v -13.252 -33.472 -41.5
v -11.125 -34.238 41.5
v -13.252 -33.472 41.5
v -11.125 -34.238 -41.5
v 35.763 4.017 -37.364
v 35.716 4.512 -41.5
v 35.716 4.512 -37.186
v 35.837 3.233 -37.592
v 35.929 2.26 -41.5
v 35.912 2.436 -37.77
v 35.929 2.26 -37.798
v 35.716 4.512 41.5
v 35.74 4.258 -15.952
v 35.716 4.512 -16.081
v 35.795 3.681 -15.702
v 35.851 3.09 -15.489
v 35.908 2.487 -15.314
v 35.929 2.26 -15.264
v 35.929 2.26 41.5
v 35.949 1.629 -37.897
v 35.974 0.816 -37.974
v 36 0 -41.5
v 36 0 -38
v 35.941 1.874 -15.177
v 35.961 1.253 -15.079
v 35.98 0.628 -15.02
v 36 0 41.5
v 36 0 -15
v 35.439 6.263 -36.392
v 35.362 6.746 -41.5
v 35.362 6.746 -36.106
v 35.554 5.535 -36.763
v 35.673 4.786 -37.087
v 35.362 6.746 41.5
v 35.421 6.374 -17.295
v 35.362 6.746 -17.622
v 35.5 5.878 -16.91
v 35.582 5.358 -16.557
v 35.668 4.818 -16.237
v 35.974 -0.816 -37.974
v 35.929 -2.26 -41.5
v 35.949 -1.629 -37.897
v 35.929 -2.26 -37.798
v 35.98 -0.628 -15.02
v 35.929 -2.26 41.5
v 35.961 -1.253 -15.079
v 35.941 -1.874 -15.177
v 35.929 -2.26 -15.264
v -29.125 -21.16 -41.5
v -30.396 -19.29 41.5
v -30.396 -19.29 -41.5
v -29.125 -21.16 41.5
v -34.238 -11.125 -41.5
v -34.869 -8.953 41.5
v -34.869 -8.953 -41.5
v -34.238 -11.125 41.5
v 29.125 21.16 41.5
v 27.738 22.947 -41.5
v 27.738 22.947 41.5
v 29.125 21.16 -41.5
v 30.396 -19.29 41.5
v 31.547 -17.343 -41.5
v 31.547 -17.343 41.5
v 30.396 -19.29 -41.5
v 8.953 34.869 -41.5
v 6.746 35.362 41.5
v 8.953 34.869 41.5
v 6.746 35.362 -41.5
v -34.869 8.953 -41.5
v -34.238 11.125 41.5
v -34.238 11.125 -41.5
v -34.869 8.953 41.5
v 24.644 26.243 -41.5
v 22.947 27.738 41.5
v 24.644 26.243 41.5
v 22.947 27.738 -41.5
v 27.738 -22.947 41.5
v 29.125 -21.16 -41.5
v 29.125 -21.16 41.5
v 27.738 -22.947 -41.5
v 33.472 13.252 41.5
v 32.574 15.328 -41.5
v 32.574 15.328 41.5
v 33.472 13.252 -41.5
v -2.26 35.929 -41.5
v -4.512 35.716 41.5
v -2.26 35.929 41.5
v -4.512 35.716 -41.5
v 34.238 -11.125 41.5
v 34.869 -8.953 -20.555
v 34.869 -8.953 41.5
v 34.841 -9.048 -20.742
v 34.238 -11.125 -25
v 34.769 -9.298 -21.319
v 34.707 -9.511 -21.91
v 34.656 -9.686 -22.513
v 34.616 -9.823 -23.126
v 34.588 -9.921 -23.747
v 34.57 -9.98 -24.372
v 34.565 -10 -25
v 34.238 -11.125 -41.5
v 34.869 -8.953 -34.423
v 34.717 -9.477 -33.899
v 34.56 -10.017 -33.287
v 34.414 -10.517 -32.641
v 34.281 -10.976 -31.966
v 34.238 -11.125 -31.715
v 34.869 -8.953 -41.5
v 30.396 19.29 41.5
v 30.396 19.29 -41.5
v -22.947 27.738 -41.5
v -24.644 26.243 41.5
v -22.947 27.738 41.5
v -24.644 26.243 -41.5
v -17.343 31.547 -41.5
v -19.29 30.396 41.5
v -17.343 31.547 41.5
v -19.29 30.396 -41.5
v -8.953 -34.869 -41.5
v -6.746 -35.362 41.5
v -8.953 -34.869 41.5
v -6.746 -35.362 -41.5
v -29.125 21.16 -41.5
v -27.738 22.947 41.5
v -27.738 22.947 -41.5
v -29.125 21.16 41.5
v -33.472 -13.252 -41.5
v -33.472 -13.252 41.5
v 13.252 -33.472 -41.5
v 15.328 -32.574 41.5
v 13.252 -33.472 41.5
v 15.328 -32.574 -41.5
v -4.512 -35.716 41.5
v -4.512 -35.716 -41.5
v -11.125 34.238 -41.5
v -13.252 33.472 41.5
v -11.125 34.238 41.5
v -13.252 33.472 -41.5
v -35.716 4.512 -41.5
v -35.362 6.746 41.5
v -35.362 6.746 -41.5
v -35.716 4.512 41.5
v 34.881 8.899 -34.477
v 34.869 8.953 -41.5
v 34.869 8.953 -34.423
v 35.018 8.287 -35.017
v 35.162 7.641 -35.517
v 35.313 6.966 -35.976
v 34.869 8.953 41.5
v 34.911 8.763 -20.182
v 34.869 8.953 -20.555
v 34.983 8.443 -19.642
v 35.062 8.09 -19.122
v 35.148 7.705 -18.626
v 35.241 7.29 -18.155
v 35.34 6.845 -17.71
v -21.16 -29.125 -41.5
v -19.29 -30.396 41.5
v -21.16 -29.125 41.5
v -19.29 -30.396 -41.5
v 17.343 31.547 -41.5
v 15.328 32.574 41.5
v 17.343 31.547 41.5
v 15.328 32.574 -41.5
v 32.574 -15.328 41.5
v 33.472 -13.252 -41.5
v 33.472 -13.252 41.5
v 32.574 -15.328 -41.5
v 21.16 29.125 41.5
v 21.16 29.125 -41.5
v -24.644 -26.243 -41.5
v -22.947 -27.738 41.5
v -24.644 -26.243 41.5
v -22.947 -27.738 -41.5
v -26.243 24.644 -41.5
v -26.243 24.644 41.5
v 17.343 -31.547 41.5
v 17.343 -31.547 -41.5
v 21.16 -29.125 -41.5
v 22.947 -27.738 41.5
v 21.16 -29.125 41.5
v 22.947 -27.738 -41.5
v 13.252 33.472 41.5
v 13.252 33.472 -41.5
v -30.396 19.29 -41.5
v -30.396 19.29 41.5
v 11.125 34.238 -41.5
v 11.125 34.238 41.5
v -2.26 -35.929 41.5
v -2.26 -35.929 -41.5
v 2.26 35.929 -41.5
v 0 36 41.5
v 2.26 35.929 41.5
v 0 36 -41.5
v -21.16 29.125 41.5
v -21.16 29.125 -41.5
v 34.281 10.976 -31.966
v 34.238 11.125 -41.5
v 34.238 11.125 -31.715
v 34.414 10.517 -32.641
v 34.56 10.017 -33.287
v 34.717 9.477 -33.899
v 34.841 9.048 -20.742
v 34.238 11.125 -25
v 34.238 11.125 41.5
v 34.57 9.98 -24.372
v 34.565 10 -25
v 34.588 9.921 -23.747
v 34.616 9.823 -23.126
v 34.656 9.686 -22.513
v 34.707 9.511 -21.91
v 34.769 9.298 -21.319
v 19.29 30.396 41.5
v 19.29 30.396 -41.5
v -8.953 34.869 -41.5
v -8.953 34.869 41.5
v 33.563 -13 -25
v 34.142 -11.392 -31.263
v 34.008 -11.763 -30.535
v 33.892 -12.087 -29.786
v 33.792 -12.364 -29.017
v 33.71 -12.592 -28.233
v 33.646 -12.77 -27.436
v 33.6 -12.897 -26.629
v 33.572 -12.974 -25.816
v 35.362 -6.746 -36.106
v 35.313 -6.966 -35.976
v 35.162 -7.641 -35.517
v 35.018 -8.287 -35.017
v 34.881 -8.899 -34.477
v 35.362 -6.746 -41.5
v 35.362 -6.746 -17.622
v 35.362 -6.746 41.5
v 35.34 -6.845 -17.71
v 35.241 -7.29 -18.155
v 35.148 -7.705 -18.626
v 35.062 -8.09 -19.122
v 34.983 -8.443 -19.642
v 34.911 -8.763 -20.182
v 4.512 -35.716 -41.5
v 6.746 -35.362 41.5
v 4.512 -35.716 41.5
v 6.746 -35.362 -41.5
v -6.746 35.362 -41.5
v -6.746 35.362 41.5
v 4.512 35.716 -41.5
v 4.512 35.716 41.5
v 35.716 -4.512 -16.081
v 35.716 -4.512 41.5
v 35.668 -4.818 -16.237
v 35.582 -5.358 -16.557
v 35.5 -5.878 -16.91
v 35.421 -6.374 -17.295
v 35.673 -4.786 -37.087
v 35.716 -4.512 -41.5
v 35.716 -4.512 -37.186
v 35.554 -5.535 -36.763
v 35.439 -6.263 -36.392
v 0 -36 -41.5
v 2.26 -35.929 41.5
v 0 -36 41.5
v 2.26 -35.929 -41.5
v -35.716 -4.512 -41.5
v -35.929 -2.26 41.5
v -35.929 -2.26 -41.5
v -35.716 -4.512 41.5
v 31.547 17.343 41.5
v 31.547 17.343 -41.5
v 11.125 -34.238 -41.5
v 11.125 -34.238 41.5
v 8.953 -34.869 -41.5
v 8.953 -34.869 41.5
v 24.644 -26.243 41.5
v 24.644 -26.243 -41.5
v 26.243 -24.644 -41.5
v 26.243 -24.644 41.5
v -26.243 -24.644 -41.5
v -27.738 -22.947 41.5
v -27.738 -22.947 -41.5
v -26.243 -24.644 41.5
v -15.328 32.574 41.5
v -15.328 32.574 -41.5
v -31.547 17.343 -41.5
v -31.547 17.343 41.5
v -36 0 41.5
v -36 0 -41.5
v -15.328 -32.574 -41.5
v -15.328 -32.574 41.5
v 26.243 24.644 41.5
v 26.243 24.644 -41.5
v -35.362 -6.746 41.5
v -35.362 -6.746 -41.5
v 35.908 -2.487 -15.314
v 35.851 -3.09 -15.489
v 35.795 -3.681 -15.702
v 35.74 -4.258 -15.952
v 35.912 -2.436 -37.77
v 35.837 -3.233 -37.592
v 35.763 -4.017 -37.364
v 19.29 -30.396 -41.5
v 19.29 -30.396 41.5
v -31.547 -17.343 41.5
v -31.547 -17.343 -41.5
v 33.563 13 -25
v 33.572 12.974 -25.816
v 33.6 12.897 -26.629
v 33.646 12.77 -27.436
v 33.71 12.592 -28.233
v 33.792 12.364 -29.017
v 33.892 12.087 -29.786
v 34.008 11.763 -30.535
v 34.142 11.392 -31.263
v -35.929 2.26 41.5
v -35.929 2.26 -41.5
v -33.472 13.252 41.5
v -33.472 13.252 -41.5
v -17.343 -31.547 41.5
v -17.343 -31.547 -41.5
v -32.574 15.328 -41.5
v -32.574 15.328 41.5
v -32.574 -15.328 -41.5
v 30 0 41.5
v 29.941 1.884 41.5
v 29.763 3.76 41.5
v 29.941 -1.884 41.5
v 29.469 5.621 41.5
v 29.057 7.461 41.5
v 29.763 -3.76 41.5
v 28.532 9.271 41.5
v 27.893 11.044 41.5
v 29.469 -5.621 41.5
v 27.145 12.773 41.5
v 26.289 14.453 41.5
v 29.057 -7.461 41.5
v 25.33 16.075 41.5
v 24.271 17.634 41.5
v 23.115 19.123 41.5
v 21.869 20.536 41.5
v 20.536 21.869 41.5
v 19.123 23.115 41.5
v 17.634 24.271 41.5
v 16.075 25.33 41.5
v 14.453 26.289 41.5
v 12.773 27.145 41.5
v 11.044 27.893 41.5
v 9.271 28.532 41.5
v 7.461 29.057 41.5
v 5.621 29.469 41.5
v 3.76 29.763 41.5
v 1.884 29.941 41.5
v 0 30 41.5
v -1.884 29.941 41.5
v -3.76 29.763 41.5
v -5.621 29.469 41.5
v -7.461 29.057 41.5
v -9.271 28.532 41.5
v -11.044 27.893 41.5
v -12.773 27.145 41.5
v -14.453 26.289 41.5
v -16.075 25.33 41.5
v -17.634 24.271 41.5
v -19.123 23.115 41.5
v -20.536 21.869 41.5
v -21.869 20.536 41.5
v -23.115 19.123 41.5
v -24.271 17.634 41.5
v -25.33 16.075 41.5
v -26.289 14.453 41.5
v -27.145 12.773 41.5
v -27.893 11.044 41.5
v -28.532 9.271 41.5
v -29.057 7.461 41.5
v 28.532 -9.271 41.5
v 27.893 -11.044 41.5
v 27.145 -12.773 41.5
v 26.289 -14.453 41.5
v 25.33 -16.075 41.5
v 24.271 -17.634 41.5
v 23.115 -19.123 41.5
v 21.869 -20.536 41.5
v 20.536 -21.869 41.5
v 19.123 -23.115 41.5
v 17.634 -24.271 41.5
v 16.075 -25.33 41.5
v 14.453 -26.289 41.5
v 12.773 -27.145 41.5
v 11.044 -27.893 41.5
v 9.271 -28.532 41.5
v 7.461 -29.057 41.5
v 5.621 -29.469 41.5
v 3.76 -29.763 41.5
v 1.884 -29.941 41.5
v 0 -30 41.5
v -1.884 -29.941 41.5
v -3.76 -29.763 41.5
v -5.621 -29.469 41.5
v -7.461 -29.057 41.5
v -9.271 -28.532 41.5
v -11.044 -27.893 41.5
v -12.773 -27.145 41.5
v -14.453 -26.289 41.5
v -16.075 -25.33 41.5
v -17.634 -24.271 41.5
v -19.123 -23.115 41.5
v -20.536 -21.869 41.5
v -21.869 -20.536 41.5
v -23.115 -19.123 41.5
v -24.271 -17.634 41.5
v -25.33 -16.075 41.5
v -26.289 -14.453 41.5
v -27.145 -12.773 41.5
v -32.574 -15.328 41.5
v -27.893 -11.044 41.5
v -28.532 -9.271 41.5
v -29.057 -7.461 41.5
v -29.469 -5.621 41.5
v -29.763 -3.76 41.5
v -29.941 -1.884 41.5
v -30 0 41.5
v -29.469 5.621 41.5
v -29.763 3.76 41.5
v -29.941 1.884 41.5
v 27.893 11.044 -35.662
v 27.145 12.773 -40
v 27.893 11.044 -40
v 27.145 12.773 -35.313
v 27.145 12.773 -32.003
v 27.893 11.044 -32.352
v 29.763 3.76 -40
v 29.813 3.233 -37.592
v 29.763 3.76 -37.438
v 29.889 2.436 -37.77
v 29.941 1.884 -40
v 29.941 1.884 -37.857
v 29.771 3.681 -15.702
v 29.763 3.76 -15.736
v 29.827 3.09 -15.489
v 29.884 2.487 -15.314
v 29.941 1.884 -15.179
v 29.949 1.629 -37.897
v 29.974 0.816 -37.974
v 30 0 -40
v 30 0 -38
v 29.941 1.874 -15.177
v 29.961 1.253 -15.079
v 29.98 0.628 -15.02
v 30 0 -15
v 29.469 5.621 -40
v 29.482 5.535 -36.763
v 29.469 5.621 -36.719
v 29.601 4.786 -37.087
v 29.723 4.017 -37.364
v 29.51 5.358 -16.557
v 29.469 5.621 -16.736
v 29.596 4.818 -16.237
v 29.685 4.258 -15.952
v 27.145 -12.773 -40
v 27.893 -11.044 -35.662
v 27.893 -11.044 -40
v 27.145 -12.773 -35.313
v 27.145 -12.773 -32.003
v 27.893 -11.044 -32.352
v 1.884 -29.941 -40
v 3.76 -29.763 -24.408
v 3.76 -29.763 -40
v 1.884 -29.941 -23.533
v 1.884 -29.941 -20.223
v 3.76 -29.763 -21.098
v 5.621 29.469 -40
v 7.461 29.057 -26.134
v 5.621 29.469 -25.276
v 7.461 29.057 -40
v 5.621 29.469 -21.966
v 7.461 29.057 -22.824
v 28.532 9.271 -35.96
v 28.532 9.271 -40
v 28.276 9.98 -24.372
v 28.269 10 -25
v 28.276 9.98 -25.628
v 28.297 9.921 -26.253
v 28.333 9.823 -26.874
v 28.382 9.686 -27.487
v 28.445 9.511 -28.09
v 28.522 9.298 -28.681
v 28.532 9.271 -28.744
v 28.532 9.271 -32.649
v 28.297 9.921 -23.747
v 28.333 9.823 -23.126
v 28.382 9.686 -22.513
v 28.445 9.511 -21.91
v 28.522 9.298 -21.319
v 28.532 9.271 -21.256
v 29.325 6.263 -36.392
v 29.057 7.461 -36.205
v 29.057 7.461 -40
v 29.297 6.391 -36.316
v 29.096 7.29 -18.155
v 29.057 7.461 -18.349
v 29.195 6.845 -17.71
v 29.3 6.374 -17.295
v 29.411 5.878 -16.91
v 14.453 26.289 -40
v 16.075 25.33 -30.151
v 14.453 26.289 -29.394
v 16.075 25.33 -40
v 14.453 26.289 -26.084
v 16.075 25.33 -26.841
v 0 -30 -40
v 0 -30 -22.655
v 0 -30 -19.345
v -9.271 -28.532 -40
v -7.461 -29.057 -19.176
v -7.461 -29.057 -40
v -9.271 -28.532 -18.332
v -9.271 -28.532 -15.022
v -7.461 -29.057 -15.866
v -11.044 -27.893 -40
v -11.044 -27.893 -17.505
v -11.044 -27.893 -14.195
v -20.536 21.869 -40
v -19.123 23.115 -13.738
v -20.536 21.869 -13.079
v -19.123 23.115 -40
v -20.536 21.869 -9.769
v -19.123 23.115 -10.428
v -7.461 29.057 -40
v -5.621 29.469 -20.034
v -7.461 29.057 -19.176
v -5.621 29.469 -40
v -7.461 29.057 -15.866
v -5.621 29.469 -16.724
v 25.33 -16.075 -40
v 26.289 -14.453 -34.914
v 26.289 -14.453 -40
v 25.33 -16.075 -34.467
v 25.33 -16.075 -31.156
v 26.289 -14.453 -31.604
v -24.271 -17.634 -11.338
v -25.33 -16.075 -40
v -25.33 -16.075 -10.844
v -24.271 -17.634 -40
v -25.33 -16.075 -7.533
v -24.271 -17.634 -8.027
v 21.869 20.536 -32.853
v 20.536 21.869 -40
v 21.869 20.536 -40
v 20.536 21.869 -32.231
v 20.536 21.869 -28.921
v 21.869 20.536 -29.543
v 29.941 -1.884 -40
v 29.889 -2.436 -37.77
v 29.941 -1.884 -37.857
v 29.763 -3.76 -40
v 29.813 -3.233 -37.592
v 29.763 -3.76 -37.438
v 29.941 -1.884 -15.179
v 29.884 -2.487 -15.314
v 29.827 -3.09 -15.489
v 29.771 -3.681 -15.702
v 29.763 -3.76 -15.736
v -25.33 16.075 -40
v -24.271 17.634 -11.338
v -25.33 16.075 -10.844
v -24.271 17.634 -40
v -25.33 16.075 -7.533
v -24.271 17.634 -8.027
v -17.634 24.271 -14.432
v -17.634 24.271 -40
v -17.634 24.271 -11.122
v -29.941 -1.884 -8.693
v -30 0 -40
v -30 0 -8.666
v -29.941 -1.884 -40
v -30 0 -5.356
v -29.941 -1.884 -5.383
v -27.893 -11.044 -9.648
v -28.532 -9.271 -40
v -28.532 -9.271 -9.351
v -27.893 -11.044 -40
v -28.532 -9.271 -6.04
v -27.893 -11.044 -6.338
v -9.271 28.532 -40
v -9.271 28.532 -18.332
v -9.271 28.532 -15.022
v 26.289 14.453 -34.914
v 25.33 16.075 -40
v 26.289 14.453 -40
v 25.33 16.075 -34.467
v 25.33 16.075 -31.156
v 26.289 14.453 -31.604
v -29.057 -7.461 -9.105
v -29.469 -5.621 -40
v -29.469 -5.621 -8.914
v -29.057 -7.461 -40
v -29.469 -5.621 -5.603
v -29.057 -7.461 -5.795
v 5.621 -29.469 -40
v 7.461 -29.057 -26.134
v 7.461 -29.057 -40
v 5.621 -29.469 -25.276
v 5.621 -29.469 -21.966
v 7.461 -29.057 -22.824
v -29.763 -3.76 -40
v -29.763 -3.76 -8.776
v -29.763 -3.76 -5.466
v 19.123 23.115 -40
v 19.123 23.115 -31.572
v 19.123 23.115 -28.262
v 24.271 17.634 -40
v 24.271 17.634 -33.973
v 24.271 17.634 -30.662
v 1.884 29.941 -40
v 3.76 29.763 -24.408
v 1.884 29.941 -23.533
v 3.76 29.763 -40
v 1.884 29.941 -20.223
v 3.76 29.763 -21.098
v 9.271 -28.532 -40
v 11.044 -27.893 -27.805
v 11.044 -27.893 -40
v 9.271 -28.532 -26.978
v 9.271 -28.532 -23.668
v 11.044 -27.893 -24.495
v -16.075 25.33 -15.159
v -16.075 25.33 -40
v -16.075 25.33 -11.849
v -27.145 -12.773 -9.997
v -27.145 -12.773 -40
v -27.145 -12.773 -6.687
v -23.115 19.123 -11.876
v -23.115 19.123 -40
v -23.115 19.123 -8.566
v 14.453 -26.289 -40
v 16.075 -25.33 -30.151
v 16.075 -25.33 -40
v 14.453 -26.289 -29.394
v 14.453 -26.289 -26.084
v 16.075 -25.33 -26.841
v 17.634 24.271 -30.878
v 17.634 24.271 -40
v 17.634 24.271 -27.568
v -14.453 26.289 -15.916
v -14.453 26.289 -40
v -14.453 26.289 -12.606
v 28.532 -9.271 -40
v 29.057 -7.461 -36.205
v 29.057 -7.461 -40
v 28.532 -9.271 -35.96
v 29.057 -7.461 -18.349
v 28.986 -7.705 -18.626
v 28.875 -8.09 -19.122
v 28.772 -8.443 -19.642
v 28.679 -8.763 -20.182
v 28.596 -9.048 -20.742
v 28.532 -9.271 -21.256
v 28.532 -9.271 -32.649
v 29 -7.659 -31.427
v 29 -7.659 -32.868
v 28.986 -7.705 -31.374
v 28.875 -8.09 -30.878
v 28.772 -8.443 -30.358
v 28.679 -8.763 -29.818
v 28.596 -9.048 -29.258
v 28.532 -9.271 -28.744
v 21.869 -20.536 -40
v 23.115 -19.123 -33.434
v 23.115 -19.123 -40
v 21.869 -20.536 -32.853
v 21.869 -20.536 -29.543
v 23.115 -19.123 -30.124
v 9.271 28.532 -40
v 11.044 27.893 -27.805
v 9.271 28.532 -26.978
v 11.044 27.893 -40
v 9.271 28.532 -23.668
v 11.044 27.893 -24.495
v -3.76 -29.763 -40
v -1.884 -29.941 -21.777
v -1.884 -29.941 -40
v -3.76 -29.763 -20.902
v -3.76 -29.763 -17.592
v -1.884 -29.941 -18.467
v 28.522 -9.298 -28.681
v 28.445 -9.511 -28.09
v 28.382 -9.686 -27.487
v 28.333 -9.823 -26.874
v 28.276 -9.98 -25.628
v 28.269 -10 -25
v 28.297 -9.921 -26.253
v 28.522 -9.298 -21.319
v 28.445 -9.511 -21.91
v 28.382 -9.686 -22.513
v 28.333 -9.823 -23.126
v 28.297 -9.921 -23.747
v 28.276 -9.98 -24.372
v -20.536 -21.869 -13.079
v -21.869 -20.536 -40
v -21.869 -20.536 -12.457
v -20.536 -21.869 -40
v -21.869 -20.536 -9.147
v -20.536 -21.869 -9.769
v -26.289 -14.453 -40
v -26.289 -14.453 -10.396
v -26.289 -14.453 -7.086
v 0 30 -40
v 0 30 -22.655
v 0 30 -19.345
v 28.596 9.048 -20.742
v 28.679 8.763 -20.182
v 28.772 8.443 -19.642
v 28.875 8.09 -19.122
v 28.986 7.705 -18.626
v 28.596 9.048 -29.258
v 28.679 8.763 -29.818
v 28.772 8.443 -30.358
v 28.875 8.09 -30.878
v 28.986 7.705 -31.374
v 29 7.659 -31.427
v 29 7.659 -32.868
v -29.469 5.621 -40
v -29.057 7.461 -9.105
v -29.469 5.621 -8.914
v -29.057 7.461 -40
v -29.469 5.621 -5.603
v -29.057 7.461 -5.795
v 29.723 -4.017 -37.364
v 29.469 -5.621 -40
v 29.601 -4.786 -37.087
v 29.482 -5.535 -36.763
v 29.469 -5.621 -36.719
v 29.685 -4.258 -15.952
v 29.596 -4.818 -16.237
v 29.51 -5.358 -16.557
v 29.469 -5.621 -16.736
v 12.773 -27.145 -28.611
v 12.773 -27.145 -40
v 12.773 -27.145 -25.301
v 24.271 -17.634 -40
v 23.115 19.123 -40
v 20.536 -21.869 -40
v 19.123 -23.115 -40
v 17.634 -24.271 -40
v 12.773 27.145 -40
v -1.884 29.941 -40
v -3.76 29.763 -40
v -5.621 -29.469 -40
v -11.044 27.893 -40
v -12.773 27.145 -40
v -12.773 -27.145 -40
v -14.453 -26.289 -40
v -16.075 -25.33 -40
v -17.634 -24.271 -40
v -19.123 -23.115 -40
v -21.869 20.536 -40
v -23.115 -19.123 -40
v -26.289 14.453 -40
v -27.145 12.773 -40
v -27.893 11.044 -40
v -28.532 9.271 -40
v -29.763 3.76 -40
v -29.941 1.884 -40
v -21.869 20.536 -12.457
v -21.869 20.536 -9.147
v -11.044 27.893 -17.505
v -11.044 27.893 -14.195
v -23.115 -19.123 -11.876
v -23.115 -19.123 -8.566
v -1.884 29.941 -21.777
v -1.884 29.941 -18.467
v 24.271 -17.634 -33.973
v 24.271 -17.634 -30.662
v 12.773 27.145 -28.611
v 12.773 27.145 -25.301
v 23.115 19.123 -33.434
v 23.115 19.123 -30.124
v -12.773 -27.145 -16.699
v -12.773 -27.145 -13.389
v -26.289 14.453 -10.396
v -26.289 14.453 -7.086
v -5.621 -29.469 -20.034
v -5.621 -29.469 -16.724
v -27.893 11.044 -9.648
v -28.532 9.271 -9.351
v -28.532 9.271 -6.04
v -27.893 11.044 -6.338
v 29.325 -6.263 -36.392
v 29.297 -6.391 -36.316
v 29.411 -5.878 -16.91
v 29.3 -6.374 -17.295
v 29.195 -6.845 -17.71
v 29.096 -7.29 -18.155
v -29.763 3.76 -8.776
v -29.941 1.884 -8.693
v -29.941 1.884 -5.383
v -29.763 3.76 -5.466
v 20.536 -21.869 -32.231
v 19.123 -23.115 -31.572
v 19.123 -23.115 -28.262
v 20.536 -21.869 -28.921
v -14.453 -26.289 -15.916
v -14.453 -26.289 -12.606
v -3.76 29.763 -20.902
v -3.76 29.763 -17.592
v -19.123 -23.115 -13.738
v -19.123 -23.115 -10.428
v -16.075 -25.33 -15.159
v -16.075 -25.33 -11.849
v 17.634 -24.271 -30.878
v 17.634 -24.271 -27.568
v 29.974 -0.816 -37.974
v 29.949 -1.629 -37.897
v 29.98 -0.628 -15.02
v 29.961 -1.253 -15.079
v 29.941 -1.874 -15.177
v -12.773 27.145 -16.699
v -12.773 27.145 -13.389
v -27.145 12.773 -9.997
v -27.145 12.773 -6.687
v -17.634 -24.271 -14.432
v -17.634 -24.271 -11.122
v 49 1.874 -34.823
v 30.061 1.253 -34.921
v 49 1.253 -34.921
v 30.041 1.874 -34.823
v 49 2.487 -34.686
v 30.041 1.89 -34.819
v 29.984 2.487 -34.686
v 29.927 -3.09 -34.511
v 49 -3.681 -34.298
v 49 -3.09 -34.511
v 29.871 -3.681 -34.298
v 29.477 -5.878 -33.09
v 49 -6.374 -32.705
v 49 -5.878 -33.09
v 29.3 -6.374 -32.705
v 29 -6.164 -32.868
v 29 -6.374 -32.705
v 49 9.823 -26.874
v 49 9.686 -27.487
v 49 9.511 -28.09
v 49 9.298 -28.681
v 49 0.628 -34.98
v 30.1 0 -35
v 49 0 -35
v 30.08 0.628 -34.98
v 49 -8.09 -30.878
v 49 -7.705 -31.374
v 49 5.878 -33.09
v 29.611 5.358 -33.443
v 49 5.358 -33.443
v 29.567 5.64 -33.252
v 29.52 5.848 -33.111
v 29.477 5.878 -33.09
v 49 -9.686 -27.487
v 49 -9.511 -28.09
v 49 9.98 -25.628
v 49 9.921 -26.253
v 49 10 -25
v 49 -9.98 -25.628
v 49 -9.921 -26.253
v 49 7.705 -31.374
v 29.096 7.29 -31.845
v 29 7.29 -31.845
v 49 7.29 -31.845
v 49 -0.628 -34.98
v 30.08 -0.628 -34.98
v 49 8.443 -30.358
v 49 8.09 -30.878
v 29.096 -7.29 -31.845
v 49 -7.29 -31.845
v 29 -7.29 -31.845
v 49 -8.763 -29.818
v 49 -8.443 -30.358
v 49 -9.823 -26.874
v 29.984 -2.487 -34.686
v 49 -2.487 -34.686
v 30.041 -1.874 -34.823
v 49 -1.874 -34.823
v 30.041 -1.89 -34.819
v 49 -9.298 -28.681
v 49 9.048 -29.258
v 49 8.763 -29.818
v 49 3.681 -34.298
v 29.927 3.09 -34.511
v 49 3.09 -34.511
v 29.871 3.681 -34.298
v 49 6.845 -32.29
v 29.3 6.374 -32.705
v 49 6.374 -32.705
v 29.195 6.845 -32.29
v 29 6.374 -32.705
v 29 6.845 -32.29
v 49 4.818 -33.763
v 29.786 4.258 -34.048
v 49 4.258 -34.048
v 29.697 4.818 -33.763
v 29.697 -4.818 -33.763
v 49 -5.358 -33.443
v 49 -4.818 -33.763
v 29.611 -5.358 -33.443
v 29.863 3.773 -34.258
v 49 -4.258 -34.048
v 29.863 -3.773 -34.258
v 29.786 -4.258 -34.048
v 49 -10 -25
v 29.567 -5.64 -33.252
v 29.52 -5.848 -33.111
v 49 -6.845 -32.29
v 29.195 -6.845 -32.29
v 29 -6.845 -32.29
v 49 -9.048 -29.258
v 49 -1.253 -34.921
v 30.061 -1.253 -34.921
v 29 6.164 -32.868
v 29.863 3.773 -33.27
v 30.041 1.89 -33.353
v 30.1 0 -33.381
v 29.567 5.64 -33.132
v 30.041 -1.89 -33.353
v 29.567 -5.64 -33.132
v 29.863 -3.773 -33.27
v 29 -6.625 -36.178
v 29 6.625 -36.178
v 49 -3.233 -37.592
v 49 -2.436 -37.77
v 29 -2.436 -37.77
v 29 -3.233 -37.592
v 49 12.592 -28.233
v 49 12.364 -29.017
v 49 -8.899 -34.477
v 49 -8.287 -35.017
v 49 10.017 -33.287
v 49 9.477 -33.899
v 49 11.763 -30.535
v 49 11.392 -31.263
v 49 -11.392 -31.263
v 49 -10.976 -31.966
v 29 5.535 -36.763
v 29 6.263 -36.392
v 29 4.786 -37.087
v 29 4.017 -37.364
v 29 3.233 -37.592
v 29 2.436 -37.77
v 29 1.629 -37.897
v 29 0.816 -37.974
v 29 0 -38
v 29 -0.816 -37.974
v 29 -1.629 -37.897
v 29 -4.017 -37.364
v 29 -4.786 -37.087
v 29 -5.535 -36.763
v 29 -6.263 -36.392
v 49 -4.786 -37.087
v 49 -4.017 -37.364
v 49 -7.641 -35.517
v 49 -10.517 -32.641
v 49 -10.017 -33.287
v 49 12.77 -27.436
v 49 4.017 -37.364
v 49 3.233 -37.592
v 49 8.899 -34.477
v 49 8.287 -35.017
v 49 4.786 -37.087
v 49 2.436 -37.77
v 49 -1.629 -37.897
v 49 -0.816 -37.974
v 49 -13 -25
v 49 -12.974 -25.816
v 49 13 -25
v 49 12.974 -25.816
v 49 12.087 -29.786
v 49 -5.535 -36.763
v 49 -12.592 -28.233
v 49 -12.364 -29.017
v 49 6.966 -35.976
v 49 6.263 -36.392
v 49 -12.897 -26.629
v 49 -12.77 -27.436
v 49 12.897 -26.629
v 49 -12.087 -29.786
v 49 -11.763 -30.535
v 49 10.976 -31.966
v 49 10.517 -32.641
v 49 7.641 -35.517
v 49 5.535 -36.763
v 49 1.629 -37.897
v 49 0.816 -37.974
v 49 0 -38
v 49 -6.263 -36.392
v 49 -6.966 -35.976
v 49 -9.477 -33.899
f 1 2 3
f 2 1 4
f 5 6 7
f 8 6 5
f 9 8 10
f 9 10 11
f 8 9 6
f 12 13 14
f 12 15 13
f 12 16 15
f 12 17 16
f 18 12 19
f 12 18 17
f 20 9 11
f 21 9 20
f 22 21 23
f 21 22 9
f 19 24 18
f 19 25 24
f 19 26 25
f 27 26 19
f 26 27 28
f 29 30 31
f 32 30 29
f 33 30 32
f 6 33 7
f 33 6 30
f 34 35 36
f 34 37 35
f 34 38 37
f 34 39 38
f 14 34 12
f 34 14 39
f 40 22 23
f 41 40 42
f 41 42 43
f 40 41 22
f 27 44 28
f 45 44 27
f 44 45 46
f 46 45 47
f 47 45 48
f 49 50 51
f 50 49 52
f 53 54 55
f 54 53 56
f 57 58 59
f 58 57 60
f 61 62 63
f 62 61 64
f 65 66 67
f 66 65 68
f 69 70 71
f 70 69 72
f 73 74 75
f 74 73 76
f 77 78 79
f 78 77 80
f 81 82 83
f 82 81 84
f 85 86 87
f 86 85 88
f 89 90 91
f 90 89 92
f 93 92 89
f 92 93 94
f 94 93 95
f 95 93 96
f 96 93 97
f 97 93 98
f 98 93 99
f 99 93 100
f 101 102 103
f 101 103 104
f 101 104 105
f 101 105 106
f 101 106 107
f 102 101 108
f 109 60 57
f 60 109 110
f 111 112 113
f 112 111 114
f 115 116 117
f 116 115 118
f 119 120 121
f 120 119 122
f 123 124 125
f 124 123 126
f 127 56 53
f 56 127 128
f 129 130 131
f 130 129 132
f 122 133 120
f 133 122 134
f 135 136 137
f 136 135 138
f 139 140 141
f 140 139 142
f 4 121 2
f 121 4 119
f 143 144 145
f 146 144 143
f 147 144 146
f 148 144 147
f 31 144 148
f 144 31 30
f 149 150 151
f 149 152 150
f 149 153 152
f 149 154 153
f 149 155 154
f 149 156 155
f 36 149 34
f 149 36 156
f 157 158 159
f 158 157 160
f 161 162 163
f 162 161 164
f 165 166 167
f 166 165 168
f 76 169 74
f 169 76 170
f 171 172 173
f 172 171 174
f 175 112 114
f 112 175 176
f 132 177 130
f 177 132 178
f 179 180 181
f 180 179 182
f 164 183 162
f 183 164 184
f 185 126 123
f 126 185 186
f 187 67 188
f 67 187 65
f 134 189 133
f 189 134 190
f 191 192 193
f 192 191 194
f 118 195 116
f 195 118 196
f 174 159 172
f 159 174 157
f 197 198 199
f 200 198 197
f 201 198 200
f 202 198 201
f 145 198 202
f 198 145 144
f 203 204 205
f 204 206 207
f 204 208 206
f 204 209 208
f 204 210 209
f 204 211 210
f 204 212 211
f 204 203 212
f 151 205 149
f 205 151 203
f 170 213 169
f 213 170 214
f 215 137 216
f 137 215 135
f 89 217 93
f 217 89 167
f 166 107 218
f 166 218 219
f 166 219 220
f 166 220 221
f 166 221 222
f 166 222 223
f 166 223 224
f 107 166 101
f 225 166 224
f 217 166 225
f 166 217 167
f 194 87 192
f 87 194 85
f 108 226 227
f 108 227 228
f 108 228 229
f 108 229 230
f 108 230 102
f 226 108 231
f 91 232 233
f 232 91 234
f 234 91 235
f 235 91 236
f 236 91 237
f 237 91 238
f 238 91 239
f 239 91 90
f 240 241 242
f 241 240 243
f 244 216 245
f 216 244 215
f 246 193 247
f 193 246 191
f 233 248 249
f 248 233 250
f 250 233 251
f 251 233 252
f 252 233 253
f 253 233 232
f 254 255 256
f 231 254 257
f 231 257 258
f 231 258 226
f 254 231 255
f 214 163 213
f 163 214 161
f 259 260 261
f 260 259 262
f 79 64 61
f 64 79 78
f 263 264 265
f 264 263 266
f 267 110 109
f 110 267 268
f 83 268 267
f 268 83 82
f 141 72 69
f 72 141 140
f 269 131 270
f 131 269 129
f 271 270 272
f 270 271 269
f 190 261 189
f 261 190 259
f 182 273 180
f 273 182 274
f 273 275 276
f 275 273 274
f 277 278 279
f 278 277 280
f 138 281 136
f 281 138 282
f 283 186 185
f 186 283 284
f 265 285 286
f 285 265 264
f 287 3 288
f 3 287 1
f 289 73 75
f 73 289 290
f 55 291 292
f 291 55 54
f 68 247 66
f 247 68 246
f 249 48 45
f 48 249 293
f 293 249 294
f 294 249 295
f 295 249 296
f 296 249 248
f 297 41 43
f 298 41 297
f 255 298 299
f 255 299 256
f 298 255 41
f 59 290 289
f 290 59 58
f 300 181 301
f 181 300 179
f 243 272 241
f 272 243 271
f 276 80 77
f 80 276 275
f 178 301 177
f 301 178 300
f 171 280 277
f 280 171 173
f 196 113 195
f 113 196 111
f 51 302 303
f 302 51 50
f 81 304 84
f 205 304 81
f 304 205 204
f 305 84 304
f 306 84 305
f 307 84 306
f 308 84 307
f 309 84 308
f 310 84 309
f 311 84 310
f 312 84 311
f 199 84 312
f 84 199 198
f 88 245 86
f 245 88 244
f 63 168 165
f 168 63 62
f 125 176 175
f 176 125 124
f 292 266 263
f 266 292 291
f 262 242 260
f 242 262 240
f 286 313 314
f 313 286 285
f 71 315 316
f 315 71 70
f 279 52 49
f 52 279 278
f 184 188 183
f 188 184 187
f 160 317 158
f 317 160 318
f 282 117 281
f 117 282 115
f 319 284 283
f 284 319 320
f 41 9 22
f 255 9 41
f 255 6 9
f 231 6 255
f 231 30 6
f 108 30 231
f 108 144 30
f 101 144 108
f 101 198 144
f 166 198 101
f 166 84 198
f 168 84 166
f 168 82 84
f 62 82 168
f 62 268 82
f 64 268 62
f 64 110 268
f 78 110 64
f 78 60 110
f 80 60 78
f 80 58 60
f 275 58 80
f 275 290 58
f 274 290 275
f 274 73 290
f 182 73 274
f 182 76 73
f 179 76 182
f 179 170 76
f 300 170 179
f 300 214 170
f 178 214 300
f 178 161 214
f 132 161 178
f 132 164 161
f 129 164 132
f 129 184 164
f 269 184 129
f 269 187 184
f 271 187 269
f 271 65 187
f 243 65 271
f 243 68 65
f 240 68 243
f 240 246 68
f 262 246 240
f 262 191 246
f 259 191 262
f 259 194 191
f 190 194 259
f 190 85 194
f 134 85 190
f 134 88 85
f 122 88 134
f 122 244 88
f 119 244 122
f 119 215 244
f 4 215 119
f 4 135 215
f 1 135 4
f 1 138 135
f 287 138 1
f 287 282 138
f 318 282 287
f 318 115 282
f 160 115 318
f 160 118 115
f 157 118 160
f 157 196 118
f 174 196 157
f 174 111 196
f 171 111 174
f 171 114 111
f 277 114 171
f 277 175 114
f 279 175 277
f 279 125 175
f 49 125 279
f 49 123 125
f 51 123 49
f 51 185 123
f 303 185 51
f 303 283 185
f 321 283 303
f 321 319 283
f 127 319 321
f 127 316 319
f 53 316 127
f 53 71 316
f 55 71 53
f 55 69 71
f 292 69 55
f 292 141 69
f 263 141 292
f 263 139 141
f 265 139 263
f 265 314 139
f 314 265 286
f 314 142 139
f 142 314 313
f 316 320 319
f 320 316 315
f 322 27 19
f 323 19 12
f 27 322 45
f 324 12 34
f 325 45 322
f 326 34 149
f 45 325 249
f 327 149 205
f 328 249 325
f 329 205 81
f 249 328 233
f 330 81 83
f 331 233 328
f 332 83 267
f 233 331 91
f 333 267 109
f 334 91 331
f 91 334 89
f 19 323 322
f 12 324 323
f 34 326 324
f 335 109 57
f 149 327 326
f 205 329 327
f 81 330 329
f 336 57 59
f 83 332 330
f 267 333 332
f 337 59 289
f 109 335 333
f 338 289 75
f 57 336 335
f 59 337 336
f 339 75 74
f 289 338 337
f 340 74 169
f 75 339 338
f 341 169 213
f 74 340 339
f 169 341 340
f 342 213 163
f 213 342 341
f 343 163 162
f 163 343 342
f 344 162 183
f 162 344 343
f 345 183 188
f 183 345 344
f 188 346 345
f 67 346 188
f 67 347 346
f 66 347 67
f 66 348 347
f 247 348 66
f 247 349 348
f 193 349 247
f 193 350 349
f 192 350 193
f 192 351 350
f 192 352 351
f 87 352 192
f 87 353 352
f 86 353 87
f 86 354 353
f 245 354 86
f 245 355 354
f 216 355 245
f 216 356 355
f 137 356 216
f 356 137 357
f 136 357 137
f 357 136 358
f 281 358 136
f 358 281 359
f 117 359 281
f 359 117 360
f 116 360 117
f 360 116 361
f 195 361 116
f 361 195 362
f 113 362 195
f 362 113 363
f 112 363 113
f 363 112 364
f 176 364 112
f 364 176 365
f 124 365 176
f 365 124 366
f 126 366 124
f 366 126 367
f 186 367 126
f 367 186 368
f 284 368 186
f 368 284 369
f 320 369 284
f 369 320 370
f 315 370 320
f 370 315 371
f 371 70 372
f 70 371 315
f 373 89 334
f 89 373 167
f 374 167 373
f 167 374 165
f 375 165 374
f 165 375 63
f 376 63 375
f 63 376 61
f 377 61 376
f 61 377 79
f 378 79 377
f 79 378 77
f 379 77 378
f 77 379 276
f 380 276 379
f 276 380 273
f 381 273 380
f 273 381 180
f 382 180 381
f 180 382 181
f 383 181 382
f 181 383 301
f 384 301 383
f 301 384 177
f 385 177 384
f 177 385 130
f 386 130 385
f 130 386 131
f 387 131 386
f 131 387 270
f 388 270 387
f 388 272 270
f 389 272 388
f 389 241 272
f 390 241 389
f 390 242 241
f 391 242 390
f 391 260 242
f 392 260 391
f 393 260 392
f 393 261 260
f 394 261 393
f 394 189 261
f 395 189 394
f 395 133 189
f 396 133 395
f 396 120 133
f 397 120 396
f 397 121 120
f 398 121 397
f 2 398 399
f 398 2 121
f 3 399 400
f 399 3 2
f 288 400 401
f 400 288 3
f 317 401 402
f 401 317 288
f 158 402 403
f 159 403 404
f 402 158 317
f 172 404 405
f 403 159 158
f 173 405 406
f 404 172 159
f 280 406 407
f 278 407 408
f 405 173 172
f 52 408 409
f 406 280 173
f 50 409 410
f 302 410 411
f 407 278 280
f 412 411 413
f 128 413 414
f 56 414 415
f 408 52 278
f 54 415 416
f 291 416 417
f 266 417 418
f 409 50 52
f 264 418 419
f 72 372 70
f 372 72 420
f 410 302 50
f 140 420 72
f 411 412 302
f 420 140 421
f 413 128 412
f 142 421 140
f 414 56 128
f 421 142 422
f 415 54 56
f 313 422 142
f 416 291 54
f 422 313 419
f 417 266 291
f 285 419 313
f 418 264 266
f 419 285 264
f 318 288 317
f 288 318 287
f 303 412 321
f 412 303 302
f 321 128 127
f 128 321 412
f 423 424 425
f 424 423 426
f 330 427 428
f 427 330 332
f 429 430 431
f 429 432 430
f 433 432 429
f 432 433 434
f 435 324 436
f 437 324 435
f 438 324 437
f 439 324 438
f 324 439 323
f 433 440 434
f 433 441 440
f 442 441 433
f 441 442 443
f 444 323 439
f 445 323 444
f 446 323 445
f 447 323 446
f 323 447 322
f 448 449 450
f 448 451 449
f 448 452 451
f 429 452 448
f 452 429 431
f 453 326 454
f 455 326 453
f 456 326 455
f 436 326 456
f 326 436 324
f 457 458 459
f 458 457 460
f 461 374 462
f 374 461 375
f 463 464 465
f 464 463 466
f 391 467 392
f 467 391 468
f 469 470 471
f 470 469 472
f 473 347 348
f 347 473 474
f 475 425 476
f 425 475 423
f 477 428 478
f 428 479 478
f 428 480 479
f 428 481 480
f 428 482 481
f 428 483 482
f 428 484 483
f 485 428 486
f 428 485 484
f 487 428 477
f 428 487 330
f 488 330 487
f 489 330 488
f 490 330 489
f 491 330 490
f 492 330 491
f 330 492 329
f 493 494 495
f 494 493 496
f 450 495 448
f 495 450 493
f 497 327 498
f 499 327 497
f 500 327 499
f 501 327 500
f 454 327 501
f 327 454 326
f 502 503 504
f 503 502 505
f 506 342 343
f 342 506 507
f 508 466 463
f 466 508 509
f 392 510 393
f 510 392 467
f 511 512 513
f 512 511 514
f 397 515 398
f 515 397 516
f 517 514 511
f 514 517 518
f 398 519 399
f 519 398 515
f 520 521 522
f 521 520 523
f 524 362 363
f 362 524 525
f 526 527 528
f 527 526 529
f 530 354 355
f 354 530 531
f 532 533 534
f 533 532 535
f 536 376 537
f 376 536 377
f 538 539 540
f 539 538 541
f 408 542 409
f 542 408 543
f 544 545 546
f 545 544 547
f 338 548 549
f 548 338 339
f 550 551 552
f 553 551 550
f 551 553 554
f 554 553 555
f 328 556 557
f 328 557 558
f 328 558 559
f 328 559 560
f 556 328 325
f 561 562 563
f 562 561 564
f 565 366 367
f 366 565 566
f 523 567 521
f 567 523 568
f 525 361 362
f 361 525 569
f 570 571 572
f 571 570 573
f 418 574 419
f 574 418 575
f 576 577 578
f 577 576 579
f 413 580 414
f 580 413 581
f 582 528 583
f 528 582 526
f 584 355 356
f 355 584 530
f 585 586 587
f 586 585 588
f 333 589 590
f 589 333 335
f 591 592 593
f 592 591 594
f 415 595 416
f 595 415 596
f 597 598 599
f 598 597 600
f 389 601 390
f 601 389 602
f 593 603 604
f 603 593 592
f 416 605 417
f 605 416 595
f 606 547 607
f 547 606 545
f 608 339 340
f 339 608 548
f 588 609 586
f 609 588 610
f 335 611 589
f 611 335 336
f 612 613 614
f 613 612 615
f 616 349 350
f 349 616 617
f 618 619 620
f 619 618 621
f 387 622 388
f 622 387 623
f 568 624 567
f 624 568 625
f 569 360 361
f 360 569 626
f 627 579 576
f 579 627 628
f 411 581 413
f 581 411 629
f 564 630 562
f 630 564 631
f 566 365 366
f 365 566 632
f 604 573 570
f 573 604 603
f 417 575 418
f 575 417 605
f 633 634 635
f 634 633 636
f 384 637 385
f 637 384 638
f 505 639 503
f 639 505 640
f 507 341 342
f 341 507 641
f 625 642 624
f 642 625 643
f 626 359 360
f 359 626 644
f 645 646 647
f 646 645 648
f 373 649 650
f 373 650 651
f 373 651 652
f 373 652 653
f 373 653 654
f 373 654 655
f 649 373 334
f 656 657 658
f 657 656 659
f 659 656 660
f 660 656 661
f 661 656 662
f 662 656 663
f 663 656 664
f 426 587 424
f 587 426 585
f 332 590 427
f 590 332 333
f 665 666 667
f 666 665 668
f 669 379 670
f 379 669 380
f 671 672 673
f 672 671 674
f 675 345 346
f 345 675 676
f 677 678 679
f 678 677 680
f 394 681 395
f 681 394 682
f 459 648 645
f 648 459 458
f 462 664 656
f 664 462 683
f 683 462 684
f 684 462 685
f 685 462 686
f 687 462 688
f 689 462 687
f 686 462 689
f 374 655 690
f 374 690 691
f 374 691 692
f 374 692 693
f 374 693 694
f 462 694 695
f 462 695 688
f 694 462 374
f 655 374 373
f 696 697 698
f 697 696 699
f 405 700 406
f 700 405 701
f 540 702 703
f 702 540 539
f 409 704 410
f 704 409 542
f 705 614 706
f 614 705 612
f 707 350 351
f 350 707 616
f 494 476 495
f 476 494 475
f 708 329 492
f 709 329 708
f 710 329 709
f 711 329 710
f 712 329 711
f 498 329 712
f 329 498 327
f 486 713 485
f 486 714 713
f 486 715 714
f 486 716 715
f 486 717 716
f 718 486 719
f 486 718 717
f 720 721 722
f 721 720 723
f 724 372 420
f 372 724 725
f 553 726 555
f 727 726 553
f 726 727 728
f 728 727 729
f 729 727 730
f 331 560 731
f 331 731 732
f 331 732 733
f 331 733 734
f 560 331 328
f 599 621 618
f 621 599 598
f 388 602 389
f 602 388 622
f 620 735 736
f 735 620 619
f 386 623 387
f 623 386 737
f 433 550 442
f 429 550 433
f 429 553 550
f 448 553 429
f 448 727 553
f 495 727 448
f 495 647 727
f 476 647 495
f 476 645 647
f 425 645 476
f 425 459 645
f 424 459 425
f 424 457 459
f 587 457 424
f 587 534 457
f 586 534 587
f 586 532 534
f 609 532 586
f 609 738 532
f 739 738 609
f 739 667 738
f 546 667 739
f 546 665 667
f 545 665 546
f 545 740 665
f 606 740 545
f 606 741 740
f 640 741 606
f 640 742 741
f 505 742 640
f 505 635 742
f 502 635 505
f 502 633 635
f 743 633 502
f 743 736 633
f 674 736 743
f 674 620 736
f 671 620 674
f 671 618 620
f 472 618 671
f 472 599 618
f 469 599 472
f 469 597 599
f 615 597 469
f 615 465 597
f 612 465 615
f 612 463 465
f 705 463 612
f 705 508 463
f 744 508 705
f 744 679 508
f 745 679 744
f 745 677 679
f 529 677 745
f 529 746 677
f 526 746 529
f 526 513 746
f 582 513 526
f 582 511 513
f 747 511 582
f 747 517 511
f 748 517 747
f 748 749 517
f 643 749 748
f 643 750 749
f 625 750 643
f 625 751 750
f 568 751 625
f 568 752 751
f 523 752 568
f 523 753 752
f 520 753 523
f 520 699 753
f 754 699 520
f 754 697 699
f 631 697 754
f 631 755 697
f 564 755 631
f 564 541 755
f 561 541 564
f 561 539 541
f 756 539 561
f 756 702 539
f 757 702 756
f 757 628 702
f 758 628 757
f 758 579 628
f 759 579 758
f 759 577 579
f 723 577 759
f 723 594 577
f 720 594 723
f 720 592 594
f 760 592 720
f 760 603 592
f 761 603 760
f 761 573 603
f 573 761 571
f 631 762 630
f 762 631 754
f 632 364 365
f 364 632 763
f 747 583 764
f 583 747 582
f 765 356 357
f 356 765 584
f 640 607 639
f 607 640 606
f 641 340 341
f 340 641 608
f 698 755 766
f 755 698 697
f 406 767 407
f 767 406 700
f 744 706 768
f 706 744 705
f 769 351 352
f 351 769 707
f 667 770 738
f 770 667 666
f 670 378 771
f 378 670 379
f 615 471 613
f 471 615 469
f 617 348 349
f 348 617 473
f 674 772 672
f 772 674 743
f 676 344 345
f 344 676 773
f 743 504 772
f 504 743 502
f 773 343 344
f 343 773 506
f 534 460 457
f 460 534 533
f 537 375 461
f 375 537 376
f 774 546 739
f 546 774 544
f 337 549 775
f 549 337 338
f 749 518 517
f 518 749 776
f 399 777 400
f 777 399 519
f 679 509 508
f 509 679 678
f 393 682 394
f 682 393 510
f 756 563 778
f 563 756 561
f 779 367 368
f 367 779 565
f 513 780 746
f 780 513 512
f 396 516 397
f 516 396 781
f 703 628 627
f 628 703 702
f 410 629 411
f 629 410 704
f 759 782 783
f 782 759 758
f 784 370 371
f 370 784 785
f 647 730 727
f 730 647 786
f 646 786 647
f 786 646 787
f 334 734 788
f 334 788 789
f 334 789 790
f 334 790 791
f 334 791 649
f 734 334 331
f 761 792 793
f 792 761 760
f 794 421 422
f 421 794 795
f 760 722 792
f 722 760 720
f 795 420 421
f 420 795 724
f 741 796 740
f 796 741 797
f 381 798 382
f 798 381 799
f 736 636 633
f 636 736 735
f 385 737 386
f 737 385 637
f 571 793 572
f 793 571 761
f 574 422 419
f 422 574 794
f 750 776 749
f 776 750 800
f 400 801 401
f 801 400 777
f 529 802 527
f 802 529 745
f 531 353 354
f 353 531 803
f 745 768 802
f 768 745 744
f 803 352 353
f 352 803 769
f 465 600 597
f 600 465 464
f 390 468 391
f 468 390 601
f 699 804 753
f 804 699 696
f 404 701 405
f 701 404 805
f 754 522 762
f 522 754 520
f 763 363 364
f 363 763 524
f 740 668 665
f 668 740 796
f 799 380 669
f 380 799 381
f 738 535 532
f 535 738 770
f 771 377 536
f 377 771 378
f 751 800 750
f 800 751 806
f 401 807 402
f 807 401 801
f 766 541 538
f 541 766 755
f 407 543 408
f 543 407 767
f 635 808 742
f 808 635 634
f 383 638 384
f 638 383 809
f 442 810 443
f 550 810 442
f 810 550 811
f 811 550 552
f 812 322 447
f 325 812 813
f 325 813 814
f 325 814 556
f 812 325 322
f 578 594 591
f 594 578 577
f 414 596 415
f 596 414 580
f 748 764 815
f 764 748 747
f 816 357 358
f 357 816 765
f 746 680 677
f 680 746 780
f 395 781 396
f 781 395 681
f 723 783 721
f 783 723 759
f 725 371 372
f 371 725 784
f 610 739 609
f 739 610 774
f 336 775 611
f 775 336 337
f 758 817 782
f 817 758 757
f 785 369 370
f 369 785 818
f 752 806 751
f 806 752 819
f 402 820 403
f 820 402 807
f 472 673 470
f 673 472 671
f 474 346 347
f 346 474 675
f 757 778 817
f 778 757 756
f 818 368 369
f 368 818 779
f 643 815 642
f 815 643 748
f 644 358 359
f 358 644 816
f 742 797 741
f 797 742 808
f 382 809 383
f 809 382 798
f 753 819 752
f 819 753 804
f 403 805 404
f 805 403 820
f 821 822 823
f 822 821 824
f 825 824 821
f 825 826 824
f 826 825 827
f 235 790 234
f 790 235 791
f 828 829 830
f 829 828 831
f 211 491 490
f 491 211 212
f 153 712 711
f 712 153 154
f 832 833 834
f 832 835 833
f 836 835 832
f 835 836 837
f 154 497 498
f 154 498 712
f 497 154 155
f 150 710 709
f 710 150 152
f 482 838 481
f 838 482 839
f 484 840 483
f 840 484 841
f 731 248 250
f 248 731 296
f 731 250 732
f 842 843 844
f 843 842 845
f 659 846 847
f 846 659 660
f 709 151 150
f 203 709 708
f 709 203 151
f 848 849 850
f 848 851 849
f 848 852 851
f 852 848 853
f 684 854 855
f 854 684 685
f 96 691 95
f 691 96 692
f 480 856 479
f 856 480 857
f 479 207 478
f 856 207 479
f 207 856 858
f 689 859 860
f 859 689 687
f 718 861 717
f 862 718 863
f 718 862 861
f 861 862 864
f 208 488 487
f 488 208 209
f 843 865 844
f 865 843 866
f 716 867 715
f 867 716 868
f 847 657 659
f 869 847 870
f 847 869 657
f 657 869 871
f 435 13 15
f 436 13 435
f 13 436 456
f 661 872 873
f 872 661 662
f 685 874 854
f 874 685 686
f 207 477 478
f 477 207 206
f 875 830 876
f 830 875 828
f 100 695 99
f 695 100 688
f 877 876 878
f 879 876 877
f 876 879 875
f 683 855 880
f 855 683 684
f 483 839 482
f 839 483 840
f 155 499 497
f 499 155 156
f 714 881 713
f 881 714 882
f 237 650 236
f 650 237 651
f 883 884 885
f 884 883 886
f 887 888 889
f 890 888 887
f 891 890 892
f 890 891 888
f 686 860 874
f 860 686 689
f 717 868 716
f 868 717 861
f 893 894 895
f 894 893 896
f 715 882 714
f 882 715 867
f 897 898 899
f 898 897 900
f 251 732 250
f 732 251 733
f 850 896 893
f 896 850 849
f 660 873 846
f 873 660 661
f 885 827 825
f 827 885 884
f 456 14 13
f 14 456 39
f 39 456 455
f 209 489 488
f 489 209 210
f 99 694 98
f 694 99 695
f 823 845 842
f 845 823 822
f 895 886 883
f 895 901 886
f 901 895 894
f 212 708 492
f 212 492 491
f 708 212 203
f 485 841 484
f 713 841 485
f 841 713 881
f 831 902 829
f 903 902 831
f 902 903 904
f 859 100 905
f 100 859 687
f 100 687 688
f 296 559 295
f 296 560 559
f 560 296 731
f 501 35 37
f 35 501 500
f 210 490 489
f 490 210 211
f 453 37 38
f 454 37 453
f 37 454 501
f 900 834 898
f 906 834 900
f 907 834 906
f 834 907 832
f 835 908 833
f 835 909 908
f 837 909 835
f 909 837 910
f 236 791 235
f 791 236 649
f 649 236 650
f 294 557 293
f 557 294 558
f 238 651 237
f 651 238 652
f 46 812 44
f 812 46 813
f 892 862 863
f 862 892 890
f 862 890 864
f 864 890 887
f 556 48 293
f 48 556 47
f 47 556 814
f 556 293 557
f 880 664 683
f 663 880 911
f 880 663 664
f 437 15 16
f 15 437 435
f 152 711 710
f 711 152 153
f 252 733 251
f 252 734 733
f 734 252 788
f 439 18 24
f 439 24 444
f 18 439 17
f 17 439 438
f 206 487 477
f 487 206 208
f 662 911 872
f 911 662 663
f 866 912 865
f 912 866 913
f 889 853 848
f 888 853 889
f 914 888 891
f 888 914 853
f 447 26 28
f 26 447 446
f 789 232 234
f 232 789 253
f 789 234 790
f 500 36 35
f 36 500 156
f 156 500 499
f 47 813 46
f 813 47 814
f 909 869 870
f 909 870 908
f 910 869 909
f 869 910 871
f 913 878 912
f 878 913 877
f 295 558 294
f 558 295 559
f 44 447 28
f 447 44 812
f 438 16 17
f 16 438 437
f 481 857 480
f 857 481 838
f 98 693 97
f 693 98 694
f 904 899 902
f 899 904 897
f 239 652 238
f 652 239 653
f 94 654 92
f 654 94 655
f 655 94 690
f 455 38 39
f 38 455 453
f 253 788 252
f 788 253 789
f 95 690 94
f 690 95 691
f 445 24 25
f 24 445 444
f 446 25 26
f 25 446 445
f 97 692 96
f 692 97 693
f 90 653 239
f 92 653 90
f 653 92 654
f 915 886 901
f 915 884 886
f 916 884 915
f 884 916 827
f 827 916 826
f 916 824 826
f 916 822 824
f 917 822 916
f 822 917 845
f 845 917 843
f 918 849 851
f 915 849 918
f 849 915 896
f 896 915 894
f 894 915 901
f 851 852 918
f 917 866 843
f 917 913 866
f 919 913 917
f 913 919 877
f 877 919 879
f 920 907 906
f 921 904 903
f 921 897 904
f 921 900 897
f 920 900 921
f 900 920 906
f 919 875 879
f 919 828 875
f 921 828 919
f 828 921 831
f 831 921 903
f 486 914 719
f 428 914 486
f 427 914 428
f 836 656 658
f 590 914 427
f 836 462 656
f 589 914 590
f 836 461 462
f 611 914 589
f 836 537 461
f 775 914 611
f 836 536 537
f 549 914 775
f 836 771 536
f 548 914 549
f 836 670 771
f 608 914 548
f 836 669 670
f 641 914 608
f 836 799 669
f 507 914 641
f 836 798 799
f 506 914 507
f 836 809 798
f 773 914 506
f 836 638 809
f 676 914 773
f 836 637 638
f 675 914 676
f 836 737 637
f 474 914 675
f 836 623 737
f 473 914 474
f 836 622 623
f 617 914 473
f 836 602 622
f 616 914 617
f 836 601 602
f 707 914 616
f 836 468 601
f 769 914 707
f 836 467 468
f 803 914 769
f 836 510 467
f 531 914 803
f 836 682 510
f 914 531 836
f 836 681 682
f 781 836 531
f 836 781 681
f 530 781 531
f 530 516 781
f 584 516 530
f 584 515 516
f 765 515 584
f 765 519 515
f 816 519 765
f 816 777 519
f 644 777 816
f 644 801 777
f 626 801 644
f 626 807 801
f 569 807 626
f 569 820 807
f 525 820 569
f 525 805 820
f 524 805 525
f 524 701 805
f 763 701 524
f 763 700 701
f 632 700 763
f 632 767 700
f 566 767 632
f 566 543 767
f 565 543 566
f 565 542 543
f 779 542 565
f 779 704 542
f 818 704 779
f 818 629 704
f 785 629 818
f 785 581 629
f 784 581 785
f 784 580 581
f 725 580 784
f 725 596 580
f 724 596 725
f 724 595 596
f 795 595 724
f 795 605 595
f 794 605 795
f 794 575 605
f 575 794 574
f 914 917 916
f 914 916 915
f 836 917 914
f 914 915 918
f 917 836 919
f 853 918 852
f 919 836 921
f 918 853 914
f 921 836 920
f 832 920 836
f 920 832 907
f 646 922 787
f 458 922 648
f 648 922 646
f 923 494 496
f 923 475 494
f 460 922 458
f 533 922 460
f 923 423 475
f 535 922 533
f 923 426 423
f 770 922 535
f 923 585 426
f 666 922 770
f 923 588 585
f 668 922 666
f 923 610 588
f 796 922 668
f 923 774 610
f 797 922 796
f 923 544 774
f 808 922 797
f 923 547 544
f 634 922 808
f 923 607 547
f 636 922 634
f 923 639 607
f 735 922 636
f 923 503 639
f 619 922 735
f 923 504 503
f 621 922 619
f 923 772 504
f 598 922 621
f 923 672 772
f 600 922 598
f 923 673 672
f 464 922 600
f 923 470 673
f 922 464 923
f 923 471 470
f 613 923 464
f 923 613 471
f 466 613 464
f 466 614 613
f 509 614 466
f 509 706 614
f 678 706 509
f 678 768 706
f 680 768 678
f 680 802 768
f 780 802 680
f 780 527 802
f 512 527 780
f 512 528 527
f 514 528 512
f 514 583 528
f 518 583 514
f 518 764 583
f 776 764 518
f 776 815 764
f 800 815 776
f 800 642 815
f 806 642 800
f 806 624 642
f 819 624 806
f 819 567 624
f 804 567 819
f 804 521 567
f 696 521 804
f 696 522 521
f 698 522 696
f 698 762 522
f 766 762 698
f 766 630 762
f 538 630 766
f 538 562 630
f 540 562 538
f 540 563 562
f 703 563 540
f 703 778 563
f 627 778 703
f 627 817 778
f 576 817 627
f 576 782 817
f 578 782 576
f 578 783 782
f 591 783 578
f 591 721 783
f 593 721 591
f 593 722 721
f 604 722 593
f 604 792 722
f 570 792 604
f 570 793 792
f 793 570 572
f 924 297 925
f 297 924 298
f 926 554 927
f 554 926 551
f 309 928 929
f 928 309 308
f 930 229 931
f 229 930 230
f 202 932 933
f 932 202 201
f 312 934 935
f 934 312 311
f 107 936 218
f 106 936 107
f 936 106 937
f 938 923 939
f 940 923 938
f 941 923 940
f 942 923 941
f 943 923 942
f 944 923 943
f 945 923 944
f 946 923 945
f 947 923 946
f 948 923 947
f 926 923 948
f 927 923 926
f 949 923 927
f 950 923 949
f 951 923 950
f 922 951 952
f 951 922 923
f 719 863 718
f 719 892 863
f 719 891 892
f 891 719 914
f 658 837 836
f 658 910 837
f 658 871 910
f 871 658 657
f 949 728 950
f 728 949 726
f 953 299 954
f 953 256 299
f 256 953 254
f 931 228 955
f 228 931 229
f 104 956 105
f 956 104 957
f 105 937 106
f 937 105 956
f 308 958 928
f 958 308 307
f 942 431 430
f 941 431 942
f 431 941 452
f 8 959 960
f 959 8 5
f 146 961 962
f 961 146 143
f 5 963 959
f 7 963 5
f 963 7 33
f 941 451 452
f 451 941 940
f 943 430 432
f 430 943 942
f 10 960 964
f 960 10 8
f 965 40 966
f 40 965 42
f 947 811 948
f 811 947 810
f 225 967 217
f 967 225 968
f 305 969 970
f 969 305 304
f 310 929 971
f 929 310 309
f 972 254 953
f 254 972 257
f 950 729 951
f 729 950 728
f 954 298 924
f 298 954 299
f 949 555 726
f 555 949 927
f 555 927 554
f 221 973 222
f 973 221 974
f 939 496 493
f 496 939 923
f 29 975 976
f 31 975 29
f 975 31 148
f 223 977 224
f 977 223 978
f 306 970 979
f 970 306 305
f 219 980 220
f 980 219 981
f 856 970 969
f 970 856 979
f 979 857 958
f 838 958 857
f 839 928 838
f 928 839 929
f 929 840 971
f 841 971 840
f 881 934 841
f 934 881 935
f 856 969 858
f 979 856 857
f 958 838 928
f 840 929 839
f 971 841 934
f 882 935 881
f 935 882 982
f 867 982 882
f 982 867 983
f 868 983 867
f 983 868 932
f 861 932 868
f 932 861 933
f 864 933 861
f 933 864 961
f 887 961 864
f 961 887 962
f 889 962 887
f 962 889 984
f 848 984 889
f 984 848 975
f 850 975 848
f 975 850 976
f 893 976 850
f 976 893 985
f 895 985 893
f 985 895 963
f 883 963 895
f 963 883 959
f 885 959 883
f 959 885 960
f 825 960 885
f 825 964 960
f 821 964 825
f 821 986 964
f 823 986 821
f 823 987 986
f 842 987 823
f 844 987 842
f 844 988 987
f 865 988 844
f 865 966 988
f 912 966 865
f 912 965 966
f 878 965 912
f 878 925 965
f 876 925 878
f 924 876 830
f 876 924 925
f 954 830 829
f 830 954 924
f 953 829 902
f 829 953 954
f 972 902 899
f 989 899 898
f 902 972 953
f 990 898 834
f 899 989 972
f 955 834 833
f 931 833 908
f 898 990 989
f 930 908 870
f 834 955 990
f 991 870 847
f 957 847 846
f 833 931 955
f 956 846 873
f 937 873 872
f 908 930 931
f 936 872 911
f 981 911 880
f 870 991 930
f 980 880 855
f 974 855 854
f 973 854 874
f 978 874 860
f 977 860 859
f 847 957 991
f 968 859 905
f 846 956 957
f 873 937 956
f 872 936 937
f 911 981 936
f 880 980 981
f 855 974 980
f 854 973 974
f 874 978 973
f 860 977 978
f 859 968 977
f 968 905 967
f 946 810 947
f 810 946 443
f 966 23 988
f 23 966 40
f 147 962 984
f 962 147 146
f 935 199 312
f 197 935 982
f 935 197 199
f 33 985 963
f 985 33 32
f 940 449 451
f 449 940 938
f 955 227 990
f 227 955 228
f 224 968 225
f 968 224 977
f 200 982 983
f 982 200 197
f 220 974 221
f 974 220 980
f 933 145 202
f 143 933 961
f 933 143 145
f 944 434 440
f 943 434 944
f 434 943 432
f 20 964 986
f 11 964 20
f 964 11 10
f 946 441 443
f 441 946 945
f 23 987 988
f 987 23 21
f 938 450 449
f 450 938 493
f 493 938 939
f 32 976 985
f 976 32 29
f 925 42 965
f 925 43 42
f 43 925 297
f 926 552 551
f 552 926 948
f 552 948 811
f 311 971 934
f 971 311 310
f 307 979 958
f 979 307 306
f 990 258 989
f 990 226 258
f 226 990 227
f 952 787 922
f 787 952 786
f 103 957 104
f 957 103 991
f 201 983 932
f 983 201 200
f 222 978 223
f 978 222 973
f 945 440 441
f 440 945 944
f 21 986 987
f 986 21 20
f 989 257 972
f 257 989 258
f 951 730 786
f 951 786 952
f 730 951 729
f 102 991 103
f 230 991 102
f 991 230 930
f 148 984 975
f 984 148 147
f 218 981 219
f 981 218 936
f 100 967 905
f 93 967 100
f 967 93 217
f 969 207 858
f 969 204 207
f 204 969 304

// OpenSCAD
$fn=100;

diameter=60;
height=80;
wall_thickness=3;
bottom_thickness=3;

module body(wthickness, diam_off) {
    
    difference() {
        cylinder(h=height+bottom_thickness, r=diameter/2+wthickness*2, center=true);

        translate([0,0,bottom_thickness])
        cylinder(h=height+bottom_thickness*2, r=diameter/2 + diam_off, center=true);
    }
    
}


module floor() {
    difference() {

        color("red")
        rotate([0,25,0])
        cube([diameter*2, diameter*2, wall_thickness], center=true);
        
        body(30, 0.1);
       
    }
}


module half_pipe(length, diameter) {
    difference() {
        cylinder(h=length, r=diameter/2 + wall_thickness, center=true);
        cylinder(h=length+2, r=diameter/2, center=true);
        
        translate([diameter, 0, 0])
        cube([diameter*2, diameter*2, length+2], center=true);
    }
}


/*
difference() {
    body(wall_thickness);


    
}

*/
difference() {
    body(wall_thickness,0);

    translate([diameter/2, 0, -(height/2 - diameter/4)])
    rotate([0,90,0])
    cylinder(h=20, r=10, center=true); 
}

translate([0,0,-21])
floor();

translate([39,0,-25])
rotate([0,270,0]) 
half_pipe(20,20);
